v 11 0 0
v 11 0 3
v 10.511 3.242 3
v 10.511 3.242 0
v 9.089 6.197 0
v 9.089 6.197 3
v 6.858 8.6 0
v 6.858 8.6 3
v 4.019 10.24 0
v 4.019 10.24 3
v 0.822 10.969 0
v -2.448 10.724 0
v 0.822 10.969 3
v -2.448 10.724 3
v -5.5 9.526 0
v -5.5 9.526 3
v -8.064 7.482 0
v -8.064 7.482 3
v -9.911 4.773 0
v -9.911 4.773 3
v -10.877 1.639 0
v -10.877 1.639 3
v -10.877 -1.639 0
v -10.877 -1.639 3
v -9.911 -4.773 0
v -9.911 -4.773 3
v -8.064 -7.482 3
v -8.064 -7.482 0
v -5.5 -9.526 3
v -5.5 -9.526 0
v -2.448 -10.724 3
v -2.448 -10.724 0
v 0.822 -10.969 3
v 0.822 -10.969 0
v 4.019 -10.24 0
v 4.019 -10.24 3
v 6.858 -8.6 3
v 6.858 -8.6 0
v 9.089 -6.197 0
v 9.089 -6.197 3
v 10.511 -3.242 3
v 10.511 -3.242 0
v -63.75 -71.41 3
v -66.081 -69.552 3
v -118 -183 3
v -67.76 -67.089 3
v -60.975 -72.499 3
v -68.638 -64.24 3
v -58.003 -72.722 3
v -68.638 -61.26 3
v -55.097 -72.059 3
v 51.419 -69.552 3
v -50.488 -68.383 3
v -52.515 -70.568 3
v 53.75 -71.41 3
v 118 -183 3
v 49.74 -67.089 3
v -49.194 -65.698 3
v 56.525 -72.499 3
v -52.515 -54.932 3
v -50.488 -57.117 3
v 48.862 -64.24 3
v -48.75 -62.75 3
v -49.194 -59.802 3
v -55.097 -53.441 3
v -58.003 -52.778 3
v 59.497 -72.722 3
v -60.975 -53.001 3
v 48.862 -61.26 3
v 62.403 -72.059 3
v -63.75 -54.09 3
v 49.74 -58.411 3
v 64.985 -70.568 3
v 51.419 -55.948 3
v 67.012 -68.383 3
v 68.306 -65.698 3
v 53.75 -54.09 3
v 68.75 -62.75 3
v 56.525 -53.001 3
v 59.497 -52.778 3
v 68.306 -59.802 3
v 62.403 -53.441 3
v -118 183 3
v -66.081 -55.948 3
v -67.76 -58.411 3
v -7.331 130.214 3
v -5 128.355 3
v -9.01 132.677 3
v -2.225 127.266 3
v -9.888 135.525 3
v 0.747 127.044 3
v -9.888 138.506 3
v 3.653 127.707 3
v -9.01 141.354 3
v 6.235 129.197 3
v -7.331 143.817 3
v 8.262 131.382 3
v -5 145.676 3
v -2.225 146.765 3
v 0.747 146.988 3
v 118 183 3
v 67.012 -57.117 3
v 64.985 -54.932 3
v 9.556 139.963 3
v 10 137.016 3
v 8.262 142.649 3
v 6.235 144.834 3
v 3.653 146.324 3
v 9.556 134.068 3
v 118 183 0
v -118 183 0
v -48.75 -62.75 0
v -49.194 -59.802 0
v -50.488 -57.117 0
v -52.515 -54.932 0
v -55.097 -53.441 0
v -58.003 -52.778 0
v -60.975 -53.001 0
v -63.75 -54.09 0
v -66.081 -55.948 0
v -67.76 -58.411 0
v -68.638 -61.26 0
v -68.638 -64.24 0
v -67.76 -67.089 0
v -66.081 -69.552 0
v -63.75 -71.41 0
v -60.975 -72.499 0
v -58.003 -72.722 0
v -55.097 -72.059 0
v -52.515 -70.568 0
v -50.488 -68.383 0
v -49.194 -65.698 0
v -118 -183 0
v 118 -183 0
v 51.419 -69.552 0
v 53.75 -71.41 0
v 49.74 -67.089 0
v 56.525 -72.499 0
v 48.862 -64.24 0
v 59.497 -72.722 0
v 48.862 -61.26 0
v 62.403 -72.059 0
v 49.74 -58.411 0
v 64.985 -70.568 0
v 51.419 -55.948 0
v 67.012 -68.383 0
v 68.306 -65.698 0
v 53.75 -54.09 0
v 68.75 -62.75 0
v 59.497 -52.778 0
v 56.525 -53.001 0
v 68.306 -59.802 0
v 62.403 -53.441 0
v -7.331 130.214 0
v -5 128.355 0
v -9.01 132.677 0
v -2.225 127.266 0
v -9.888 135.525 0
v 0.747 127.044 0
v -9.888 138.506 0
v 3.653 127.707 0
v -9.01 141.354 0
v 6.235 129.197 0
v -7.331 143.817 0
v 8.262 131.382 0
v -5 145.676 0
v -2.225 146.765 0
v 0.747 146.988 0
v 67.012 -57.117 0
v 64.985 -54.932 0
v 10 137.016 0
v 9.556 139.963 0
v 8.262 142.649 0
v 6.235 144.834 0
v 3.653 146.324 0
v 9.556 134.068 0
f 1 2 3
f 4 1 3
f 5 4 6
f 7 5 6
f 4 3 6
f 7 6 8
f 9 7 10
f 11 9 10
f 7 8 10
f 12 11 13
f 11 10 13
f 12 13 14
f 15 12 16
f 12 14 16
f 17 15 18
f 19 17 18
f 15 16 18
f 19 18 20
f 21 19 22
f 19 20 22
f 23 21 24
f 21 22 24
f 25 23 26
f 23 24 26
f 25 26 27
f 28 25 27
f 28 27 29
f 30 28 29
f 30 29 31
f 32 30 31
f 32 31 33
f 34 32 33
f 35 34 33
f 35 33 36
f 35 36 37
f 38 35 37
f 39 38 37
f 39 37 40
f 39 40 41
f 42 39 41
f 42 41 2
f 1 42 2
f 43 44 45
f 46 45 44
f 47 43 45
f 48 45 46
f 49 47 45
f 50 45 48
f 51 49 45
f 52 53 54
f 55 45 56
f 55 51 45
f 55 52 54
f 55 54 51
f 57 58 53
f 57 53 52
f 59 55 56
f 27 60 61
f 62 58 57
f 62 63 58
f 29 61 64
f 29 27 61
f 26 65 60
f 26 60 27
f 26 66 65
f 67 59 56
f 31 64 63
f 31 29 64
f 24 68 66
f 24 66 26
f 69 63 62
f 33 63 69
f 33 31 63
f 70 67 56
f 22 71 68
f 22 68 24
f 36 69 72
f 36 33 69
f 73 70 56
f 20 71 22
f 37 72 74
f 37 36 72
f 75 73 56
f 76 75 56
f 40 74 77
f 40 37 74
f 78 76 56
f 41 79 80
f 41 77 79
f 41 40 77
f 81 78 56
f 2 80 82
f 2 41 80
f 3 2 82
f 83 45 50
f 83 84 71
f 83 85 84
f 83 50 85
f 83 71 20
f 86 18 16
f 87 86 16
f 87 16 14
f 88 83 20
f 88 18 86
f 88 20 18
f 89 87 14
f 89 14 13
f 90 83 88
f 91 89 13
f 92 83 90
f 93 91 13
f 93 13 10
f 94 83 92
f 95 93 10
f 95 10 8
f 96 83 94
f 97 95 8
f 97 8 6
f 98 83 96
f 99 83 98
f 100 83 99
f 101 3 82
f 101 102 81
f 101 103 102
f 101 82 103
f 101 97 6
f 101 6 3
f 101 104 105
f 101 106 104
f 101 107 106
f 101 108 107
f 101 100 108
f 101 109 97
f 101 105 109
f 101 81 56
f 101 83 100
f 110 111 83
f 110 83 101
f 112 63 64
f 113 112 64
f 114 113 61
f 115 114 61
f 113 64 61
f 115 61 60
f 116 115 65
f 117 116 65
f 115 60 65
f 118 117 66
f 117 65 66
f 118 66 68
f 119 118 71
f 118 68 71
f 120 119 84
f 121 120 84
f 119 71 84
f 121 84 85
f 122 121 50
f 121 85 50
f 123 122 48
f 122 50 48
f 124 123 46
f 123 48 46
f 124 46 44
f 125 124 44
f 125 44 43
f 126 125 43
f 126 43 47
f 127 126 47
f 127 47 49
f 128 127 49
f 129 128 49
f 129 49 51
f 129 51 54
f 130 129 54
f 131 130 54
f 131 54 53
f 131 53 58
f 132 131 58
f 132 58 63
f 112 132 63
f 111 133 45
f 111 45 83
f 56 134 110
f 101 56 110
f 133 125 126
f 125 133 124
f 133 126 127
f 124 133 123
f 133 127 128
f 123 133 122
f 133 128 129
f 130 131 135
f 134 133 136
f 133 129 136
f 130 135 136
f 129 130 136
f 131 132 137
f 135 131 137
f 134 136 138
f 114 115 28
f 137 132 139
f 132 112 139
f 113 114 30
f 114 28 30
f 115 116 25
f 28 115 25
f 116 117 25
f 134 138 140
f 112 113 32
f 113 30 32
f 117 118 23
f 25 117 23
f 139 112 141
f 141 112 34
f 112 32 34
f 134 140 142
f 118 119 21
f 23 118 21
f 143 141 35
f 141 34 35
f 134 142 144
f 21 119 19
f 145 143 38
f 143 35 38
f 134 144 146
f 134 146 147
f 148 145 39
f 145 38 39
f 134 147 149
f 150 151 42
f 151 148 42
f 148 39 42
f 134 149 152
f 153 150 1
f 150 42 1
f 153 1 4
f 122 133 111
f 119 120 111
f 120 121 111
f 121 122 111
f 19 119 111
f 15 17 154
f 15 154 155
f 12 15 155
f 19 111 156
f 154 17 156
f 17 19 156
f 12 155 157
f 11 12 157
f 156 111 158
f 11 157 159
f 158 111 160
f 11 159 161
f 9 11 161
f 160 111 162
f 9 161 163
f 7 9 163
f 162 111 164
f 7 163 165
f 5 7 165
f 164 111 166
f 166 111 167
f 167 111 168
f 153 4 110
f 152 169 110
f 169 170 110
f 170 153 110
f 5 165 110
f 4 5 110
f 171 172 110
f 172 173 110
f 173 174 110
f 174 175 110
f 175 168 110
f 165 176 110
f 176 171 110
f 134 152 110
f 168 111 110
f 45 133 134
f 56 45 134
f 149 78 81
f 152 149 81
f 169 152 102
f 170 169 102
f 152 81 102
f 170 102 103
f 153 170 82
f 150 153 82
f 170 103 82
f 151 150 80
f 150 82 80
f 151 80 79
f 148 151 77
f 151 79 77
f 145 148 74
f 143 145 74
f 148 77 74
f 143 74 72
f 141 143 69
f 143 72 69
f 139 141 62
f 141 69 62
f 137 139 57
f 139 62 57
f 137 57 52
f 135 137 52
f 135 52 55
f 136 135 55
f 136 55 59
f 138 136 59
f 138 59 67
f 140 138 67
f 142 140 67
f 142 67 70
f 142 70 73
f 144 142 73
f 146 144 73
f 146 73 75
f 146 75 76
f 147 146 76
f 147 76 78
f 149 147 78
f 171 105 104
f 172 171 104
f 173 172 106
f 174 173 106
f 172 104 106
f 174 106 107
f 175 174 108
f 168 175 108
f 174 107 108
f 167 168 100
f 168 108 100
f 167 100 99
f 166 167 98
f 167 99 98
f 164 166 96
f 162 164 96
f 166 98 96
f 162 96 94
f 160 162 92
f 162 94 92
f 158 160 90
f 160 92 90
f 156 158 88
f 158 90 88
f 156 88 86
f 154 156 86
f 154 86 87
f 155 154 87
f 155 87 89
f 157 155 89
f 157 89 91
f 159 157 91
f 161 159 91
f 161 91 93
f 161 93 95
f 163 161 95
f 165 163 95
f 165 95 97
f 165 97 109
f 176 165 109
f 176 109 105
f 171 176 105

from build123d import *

# Parameters (mm, degrees)
SKETCH1_W           = 236
SKETCH1_H           = 366
BOSS_EXTRUDE1_DEPTH = 3
CUT_EXTRUDE2_REACH  = 5
SKETCH2_R           = 7.5
CUT_EXTRUDE3_REACH  = 5
SKETCH3_R           = 11
SKETCH3_R_2         = 10


with BuildPart() as part:
    # Sketch1 → Boss-Extrude1 (new body)
    with BuildSketch(Plane.XY):
        Rectangle(SKETCH1_W, SKETCH1_H)
    extrude(amount=BOSS_EXTRUDE1_DEPTH)

    # Sketch2 → Cut-Extrude2 (cut, up to next)
    with BuildSketch(Plane(origin=(0, 0, 0), x_dir=(-1, 0, 0), z_dir=(0, 0, -1)), mode=Mode.PRIVATE) as cut_extrude2_sk1:
        with Locations((0, 137.5)):
            Circle(SKETCH2_R)
    cut_extrude2_tool1 = extrude(cut_extrude2_sk1.sketch, amount=-CUT_EXTRUDE2_REACH, mode=Mode.PRIVATE) & part.part
    add(cut_extrude2_tool1.solids().sort_by_distance((0, 137.5, 0))[0], mode=Mode.SUBTRACT)

    # Sketch3 → Cut-Extrude3 (cut, up to next)
    with BuildSketch(Plane.XY.offset(3), mode=Mode.PRIVATE) as cut_extrude3_sk1:
        Circle(SKETCH3_R)
    cut_extrude3_tool1 = extrude(cut_extrude3_sk1.sketch, amount=-CUT_EXTRUDE3_REACH, mode=Mode.PRIVATE) & part.part
    add(cut_extrude3_tool1.solids().sort_by_distance((0, 0, 3))[0], mode=Mode.SUBTRACT)
    # Sketch3 → Cut-Extrude3 (cut, up to next)
    with BuildSketch(Plane.XY.offset(3), mode=Mode.PRIVATE) as cut_extrude3_sk2:
        with Locations((-58.75, -62.75)):
            Circle(SKETCH3_R_2)
    cut_extrude3_tool2 = extrude(cut_extrude3_sk2.sketch, amount=-CUT_EXTRUDE3_REACH, mode=Mode.PRIVATE) & part.part
    add(cut_extrude3_tool2.solids().sort_by_distance((-58.75, -62.75, 3))[0], mode=Mode.SUBTRACT)
    # Sketch3 → Cut-Extrude3 (cut, up to next)
    with BuildSketch(Plane.XY.offset(3), mode=Mode.PRIVATE) as cut_extrude3_sk3:
        with Locations((58.75, -62.75)):
            Circle(SKETCH3_R_2)
    cut_extrude3_tool3 = extrude(cut_extrude3_sk3.sketch, amount=-CUT_EXTRUDE3_REACH, mode=Mode.PRIVATE) & part.part
    add(cut_extrude3_tool3.solids().sort_by_distance((58.75, -62.75, 3))[0], mode=Mode.SUBTRACT)
    # Sketch3 → Cut-Extrude3 (cut, up to next)
    with BuildSketch(Plane.XY.offset(3), mode=Mode.PRIVATE) as cut_extrude3_sk4:
        with Locations((0, 137.015625)):
            Circle(SKETCH3_R_2)
    cut_extrude3_tool4 = extrude(cut_extrude3_sk4.sketch, amount=-CUT_EXTRUDE3_REACH, mode=Mode.PRIVATE) & part.part
    add(cut_extrude3_tool4.solids().sort_by_distance((0, 137.015625, 3))[0], mode=Mode.SUBTRACT)


solid = part.part
